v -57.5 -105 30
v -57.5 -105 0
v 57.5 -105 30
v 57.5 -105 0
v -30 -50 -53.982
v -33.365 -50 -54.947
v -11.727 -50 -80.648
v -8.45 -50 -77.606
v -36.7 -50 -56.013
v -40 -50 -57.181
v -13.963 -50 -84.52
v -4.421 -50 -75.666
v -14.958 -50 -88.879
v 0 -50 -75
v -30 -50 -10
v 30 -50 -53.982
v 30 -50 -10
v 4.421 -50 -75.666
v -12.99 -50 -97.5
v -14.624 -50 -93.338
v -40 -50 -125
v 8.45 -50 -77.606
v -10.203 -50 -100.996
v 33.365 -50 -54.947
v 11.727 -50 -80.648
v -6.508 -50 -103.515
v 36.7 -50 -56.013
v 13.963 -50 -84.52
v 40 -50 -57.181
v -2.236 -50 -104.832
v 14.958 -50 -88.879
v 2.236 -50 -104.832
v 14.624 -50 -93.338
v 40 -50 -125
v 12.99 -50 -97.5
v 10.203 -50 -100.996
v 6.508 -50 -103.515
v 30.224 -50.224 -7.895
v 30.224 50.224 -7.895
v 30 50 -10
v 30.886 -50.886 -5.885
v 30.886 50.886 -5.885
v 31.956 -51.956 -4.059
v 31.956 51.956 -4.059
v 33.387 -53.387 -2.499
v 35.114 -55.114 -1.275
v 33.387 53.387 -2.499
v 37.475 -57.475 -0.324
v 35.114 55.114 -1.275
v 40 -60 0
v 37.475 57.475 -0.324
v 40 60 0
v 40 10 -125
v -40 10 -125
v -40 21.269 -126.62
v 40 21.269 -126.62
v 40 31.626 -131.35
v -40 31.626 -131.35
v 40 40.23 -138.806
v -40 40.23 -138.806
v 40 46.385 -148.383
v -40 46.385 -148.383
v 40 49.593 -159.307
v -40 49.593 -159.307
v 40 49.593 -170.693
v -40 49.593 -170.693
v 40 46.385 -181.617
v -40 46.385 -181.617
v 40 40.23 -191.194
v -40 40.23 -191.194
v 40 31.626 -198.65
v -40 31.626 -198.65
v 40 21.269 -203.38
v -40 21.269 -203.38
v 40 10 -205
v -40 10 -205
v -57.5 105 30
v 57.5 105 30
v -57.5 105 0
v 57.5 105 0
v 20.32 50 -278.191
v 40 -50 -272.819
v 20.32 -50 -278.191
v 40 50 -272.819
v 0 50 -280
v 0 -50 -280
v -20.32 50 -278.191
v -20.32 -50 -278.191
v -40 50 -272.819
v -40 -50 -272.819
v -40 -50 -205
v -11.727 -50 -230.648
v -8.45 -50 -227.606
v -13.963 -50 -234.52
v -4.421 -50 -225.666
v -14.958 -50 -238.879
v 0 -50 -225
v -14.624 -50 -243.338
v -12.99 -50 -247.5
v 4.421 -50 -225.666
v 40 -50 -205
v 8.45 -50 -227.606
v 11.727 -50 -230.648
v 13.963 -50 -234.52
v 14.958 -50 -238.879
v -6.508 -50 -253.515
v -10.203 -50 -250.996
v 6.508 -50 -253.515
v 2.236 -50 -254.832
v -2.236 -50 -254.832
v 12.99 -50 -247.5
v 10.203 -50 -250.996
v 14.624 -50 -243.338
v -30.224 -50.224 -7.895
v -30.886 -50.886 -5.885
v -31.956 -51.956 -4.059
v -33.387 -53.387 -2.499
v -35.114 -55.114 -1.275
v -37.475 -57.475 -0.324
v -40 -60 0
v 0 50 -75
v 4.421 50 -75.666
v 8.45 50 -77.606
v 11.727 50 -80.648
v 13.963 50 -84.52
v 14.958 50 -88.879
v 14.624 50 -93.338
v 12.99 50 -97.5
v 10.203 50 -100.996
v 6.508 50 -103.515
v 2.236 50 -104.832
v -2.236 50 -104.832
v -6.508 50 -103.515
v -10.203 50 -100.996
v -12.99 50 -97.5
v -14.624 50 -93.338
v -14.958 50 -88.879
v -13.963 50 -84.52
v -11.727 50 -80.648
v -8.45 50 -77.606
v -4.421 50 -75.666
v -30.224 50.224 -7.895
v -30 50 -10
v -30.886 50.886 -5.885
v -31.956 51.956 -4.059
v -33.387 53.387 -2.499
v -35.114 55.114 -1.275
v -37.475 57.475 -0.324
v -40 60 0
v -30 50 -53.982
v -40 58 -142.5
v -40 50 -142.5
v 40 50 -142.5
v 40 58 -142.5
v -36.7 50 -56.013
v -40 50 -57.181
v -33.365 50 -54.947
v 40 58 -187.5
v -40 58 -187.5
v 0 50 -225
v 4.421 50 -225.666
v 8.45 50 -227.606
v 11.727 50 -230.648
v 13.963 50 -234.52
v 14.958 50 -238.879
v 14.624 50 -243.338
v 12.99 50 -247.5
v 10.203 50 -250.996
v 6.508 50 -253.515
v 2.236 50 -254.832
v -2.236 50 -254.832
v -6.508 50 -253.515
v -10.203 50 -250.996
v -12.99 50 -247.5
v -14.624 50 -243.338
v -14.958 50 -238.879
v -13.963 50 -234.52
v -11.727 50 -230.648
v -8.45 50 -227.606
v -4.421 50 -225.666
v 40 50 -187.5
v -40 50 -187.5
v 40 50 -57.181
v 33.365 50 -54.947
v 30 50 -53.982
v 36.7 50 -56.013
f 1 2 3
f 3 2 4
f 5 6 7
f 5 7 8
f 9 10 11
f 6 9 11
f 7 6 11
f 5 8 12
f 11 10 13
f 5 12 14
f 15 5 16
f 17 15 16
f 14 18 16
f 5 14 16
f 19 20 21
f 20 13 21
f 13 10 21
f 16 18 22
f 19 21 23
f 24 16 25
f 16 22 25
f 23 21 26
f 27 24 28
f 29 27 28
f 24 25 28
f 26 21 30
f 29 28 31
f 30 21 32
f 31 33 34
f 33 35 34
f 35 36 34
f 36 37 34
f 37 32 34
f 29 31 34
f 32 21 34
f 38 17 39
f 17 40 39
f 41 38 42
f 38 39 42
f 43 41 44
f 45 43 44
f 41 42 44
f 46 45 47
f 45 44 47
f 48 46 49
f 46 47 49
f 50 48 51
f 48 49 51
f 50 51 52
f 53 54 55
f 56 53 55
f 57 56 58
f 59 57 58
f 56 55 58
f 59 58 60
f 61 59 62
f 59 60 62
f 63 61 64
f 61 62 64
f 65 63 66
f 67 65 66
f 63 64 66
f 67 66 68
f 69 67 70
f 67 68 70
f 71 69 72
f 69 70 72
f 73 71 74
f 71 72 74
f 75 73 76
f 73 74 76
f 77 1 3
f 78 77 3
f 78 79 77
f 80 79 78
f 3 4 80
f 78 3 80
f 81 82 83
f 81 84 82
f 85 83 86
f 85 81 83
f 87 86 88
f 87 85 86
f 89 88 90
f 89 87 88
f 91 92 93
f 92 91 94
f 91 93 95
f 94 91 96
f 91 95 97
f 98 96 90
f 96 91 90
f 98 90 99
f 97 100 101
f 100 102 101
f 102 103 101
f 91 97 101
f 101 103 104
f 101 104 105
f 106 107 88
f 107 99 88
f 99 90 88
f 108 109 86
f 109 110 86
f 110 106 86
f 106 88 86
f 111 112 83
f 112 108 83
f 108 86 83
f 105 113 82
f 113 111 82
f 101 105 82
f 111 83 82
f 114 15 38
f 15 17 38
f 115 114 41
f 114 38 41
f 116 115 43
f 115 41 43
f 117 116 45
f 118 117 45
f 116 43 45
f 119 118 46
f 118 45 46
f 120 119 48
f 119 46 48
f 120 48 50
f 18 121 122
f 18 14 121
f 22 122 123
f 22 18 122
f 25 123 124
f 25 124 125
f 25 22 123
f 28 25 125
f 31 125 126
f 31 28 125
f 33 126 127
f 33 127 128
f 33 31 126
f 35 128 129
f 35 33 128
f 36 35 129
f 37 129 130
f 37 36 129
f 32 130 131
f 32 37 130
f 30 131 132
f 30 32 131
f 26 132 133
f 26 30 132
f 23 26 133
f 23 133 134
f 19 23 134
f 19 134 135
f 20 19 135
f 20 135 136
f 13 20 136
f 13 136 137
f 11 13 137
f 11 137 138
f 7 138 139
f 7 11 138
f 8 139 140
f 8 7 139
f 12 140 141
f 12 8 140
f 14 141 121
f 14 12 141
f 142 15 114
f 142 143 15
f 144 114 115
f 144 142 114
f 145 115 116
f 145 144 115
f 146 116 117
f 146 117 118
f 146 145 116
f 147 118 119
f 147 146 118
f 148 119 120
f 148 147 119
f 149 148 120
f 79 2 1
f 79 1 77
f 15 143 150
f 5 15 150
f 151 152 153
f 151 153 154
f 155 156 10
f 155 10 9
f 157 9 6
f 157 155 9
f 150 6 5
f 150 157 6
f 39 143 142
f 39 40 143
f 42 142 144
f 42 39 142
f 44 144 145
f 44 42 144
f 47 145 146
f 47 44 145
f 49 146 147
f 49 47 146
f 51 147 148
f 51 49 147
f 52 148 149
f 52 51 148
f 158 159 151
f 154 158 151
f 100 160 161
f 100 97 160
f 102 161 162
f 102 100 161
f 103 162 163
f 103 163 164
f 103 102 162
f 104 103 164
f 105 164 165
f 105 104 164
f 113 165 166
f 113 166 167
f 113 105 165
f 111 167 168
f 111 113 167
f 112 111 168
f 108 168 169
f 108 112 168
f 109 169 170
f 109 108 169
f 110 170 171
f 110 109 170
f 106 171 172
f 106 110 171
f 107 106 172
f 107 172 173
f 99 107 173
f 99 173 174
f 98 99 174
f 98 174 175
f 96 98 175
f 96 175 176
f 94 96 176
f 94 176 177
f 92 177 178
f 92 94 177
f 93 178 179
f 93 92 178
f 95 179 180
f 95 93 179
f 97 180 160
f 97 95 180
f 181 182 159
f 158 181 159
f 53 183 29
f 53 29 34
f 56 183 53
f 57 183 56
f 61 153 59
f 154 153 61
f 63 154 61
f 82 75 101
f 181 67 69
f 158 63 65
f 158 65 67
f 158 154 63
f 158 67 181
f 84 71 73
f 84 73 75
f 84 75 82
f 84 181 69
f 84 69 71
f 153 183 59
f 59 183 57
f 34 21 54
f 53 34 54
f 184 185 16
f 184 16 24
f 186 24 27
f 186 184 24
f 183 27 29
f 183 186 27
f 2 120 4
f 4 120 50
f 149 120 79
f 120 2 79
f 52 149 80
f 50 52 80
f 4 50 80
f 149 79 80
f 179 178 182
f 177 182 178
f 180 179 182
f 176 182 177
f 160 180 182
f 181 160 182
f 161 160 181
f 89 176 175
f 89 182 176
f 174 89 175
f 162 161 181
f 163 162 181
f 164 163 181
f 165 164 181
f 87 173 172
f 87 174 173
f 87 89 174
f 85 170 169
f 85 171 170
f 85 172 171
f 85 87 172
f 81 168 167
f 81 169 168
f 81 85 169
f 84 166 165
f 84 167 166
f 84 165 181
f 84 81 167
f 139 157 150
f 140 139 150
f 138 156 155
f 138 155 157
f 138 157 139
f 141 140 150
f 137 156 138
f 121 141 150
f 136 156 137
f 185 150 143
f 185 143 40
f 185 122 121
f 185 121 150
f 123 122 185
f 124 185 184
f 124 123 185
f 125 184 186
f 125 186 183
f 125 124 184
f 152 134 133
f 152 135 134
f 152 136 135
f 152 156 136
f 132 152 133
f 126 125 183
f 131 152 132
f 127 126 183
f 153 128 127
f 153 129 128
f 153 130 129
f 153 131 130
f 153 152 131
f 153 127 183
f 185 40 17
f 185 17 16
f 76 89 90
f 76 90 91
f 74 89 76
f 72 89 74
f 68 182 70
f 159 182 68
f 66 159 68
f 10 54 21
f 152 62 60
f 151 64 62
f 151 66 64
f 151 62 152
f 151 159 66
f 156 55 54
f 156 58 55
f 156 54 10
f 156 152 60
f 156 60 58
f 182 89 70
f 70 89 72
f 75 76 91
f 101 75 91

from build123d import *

# Parameters (mm, degrees)
SKETCH1_W           = 115
SKETCH1_H           = 210
BOSS_EXTRUDE1_DEPTH = 30
SKETCH3_W           = 60
SKETCH3_H           = 60
BOSS_EXTRUDE2_DEPTH = 50
SKETCH4_R           = 15
BOSS_EXTRUDE3_DEPTH = 50
FILLET1_R           = 10
SKETCH7_W           = 45
SKETCH7_H           = 8
BOSS_EXTRUDE6_DEPTH = 80
CUT_EXTRUDE1_DEPTH  = 226


with BuildPart() as part:
    # Sketch1 → Boss-Extrude1 (new body)
    with BuildSketch(Plane.XY):
        Rectangle(SKETCH1_W, SKETCH1_H)
    extrude(amount=BOSS_EXTRUDE1_DEPTH)

    # Sketch3 → Boss-Extrude2 (add, symmetric)
    with BuildSketch(Plane(origin=(0, 0, 0), x_dir=(1, 0, 0), z_dir=(0, 1, 0))):
        with Locations((0, 30)):
            Rectangle(SKETCH3_W, SKETCH3_H)
    extrude(amount=BOSS_EXTRUDE2_DEPTH, both=True)

    # Sketch4 → Boss-Extrude3 (add, symmetric)
    with BuildSketch(Plane(origin=(0, 0, 0), x_dir=(1, 0, 0), z_dir=(0, 1, 0))):
        with BuildLine():
            Line((-40, 272.819293264), (-40, 57.180706736))
            ThreePointArc((-40, 57.180706736), (0, 50), (40, 57.180706736))
            Line((40, 57.180706736), (40, 272.819293264))
            ThreePointArc((40, 272.819293264), (0, 280), (-40, 272.819293264))
        make_face()
        with Locations(Location((0, 240, 0), (0, 0, 270))):
            Circle(SKETCH4_R, mode=Mode.SUBTRACT)
        with Locations(Location((0, 90, 0), (0, 0, 270))):
            Circle(SKETCH4_R, mode=Mode.SUBTRACT)
    extrude(amount=BOSS_EXTRUDE3_DEPTH, both=True)

    # Fillet1
    fillet1_edges = [part.edges().sort_by_distance(p)[0] for p in [
        (0, -50, 0),
        (-30, 0, 0),
        (30, 0, 0),
        (0, 50, 0),
    ]]
    fillet(fillet1_edges, radius=FILLET1_R)

    # Sketch7 → Boss-Extrude6 (add)
    with BuildSketch(Plane.ZY.offset(40)):
        with Locations((-165, 54)):
            Rectangle(SKETCH7_W, SKETCH7_H)
    extrude(amount=-BOSS_EXTRUDE6_DEPTH)

    # Sketch11 → Cut-Extrude1 (cut)
    with BuildSketch(Plane.ZY.offset(40)):
        with BuildLine():
            Line((-205, 10), (-205, -50))
            Line((-205, -50), (-125, -50))
            Line((-125, -50), (-125, 10))
            ThreePointArc((-125, 10), (-165, 50), (-205, 10))
        make_face()
    extrude(amount=-CUT_EXTRUDE1_DEPTH, mode=Mode.SUBTRACT)


solid = part.part
